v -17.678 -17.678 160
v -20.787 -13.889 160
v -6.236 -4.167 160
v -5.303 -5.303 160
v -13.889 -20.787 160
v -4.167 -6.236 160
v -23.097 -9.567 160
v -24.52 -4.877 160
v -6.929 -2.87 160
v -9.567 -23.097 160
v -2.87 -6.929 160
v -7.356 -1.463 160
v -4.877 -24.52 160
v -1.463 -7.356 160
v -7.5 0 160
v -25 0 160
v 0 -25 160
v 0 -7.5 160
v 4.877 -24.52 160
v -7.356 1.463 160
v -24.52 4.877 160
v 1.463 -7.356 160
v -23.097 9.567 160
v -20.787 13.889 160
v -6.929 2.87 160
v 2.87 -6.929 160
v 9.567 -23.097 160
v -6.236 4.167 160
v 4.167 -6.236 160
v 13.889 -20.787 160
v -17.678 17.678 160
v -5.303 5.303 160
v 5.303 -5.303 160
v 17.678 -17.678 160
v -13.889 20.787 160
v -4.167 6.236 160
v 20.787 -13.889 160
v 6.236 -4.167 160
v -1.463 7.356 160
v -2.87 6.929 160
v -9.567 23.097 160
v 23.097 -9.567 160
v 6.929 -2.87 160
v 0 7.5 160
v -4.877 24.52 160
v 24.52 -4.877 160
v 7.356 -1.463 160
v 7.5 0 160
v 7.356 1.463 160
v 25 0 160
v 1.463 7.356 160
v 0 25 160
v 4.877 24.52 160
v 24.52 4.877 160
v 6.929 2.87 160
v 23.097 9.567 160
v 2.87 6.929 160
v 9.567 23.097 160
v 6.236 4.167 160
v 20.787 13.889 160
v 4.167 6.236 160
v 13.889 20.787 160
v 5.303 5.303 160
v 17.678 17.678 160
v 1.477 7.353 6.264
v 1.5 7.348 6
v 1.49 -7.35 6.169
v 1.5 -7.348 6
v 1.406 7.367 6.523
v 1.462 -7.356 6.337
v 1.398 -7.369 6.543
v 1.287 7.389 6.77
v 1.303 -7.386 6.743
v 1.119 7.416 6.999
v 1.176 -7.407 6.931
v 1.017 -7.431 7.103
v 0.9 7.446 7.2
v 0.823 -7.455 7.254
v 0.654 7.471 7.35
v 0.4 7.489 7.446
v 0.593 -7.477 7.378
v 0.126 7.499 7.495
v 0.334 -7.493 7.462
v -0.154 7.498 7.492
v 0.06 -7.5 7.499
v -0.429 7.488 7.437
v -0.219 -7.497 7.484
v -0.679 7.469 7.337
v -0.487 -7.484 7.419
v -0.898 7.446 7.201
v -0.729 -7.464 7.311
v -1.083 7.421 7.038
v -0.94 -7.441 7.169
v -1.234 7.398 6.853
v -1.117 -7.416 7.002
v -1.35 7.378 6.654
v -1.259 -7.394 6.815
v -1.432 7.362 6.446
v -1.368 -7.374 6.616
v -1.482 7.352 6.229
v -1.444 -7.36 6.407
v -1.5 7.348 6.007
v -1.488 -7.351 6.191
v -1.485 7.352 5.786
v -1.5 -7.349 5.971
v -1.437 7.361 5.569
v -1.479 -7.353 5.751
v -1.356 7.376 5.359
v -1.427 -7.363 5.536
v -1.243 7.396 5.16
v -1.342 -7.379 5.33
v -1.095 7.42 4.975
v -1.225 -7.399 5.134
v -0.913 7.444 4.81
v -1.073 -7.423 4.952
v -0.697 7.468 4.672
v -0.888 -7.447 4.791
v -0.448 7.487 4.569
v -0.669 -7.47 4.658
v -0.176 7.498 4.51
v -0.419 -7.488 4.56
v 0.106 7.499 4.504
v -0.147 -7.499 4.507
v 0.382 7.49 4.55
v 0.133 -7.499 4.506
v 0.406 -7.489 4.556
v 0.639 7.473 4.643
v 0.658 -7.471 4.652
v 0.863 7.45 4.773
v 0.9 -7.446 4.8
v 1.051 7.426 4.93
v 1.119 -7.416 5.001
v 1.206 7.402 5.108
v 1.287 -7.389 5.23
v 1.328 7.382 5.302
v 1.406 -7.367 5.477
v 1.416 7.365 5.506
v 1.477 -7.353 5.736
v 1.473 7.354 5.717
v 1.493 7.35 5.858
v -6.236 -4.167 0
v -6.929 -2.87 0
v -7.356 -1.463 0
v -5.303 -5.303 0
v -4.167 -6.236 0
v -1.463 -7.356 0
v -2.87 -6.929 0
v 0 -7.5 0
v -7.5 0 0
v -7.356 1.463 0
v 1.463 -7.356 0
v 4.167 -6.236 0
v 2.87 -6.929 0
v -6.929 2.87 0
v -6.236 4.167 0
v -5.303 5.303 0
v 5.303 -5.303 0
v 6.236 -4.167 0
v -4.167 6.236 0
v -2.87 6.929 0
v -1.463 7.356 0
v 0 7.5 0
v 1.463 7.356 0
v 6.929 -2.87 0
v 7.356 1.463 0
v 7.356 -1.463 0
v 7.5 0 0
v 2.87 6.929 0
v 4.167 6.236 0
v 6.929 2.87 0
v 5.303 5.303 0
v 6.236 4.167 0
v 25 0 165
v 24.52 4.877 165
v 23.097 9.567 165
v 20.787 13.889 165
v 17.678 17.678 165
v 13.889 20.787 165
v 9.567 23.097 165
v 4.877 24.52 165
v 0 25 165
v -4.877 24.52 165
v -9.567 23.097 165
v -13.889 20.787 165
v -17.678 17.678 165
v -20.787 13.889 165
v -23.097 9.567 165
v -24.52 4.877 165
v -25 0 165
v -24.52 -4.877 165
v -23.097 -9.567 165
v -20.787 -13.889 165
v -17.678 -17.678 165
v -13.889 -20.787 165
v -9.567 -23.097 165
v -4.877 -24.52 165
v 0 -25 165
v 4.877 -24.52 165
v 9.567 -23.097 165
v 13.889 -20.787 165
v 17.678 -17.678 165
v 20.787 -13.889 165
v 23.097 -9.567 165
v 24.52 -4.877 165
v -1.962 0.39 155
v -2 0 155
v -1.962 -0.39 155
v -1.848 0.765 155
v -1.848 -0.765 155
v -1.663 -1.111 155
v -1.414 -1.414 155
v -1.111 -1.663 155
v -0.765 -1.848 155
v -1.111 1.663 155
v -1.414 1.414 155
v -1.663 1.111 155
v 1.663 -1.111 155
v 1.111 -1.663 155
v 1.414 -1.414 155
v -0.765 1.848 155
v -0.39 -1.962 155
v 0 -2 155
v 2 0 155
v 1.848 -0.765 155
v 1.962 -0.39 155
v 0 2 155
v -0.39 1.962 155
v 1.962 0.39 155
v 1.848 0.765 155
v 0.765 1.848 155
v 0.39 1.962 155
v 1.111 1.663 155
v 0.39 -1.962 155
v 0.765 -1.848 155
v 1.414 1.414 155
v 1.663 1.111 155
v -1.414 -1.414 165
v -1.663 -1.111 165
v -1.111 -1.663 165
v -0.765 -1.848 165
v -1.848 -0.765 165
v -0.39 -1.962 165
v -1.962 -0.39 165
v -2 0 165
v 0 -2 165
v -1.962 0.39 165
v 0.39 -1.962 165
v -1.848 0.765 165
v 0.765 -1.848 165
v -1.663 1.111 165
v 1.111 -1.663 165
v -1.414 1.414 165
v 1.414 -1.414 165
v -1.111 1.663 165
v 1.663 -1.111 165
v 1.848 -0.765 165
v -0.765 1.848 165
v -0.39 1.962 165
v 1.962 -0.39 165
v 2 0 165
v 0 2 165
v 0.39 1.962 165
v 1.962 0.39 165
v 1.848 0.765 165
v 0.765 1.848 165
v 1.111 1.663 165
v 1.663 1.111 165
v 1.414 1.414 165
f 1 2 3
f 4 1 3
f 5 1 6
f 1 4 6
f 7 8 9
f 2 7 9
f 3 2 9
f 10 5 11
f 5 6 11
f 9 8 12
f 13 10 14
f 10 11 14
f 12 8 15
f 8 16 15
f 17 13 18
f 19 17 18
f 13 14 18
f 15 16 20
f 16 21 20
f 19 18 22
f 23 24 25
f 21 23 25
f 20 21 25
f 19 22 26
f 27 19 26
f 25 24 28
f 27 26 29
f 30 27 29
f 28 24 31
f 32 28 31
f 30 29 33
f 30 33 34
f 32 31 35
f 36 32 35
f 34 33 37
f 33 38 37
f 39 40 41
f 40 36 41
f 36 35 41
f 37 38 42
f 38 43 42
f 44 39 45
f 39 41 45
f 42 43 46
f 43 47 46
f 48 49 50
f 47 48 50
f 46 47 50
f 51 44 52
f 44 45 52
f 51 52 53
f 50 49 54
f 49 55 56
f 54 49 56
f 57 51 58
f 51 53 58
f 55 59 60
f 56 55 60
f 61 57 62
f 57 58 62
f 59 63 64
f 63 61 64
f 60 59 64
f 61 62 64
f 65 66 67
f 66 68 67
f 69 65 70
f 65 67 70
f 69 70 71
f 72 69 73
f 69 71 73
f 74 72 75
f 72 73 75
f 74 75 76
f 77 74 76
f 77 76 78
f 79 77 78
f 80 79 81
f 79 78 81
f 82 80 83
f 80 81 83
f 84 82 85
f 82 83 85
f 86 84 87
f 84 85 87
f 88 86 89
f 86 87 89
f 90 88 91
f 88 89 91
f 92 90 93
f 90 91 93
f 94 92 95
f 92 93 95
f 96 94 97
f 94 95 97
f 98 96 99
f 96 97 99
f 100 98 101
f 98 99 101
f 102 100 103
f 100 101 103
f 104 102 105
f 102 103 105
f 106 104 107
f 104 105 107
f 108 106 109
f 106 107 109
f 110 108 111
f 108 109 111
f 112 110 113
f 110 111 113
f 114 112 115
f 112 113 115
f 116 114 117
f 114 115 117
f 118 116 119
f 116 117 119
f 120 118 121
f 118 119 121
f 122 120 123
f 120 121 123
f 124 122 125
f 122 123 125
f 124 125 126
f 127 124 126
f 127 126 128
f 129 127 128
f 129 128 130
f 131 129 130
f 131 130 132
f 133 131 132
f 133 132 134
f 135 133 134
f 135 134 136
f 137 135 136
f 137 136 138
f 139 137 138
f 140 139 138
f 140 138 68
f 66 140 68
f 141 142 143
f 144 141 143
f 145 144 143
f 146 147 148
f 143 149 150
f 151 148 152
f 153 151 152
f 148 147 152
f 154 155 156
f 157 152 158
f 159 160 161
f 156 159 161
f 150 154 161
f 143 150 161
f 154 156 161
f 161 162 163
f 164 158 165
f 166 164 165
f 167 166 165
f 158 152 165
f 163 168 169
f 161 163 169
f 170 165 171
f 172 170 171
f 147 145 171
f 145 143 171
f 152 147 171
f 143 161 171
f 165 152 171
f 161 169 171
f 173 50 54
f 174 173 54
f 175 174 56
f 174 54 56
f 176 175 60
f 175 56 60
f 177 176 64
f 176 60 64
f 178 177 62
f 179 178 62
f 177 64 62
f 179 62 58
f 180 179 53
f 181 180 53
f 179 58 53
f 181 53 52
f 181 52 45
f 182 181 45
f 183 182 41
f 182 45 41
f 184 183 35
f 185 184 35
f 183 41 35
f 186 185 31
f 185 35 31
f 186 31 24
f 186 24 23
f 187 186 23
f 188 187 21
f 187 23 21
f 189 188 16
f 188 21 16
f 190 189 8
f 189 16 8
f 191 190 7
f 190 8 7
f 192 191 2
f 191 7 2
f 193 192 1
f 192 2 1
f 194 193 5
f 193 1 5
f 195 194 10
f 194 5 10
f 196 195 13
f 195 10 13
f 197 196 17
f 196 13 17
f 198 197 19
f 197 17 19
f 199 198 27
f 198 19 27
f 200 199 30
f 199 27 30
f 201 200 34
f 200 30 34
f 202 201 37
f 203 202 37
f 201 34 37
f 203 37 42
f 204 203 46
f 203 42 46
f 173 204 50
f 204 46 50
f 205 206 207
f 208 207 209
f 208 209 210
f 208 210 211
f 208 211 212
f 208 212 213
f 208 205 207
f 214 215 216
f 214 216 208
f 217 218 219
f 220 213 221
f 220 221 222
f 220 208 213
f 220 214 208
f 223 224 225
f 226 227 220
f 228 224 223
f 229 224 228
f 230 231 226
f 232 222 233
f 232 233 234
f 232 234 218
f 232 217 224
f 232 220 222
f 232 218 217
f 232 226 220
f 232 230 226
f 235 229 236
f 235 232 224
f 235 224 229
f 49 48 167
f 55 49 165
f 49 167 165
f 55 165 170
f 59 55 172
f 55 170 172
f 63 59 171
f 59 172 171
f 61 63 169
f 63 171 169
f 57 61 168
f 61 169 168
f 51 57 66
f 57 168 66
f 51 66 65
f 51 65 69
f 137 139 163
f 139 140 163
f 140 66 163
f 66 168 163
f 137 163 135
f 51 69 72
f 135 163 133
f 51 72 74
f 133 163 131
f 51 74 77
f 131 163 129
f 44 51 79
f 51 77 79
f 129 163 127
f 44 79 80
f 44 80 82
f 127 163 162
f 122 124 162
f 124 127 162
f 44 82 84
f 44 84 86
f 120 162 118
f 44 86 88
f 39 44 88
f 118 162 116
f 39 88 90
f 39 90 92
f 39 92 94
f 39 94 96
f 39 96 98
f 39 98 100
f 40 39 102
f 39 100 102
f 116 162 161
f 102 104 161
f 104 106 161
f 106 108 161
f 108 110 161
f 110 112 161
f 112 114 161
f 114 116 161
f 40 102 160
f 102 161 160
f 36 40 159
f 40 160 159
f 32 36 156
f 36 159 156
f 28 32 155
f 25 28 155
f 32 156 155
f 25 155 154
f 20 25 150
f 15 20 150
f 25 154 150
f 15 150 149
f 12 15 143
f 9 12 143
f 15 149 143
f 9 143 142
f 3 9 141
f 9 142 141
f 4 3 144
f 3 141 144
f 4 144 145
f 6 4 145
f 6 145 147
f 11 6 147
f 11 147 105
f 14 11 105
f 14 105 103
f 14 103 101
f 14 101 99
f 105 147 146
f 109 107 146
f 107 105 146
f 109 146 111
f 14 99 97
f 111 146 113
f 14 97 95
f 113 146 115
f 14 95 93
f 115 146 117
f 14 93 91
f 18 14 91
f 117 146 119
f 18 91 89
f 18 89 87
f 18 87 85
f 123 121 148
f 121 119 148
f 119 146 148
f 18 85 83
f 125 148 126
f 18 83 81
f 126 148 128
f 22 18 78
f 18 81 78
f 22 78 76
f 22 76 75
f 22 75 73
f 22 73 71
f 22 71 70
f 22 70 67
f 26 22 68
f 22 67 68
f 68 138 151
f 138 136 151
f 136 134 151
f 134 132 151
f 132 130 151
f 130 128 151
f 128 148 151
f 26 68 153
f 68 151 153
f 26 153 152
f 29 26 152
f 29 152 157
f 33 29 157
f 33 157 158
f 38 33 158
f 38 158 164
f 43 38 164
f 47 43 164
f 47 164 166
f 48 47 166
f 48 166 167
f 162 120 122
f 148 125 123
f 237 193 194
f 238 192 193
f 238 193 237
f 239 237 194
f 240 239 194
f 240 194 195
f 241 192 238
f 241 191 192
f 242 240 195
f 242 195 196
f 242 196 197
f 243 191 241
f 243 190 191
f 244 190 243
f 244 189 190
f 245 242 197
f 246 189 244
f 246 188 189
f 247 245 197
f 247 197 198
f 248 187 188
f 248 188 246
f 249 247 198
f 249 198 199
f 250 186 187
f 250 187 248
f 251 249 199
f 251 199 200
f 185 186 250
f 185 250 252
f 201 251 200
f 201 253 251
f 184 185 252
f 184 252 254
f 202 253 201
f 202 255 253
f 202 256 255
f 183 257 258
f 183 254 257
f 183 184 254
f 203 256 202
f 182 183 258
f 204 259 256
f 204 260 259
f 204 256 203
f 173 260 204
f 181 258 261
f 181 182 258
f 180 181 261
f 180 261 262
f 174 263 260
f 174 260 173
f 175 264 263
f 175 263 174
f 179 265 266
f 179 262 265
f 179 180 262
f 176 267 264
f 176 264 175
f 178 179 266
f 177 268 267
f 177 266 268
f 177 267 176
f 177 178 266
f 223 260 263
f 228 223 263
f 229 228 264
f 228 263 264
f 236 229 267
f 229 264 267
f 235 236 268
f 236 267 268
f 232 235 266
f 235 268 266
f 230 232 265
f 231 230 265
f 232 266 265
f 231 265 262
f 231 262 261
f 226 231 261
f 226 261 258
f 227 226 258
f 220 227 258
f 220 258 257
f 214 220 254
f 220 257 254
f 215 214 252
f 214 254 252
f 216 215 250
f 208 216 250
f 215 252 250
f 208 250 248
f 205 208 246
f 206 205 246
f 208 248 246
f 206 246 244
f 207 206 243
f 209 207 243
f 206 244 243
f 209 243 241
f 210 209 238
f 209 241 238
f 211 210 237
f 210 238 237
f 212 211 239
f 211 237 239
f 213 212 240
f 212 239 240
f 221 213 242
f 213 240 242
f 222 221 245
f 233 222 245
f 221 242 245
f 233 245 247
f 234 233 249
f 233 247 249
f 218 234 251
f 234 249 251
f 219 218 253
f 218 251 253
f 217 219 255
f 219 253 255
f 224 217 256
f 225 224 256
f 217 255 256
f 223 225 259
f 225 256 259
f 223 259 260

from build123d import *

# Parameters (mm, degrees)
F0_R          = 7.5
F1_DEPTH      = 160
F2_R          = 25
F3_DEPTH      = 5
F4_R          = 1.5
F5_DEPTH      = 7.5
F5_DEPTH_BACK = 7.5
F6_R          = 2
F7_DEPTH      = 10


with BuildPart() as f1:
    # F0 (on Top) → F1 (new body)
    with BuildSketch(Plane.XY):
        Circle(F0_R)
    extrude(amount=F1_DEPTH)

    # F2 (on face) → F3 (join)
    with BuildSketch(Plane.XY.offset(160)):
        Circle(F2_R)
    extrude(amount=F3_DEPTH)

    # F4 (on Front) → F5 (cut, two sides)
    with BuildSketch(Plane.XZ) as f5_sk:
        with Locations((0, 6)):
            Circle(F4_R)
    extrude(amount=-F5_DEPTH, mode=Mode.SUBTRACT)
    extrude(f5_sk.sketch, amount=F5_DEPTH_BACK, mode=Mode.SUBTRACT)

    # F6 (on face) → F7 (cut)
    with BuildSketch(Plane.XY.offset(165)):
        Circle(F6_R)
    extrude(amount=-F7_DEPTH, mode=Mode.SUBTRACT)


solid = f1.part
